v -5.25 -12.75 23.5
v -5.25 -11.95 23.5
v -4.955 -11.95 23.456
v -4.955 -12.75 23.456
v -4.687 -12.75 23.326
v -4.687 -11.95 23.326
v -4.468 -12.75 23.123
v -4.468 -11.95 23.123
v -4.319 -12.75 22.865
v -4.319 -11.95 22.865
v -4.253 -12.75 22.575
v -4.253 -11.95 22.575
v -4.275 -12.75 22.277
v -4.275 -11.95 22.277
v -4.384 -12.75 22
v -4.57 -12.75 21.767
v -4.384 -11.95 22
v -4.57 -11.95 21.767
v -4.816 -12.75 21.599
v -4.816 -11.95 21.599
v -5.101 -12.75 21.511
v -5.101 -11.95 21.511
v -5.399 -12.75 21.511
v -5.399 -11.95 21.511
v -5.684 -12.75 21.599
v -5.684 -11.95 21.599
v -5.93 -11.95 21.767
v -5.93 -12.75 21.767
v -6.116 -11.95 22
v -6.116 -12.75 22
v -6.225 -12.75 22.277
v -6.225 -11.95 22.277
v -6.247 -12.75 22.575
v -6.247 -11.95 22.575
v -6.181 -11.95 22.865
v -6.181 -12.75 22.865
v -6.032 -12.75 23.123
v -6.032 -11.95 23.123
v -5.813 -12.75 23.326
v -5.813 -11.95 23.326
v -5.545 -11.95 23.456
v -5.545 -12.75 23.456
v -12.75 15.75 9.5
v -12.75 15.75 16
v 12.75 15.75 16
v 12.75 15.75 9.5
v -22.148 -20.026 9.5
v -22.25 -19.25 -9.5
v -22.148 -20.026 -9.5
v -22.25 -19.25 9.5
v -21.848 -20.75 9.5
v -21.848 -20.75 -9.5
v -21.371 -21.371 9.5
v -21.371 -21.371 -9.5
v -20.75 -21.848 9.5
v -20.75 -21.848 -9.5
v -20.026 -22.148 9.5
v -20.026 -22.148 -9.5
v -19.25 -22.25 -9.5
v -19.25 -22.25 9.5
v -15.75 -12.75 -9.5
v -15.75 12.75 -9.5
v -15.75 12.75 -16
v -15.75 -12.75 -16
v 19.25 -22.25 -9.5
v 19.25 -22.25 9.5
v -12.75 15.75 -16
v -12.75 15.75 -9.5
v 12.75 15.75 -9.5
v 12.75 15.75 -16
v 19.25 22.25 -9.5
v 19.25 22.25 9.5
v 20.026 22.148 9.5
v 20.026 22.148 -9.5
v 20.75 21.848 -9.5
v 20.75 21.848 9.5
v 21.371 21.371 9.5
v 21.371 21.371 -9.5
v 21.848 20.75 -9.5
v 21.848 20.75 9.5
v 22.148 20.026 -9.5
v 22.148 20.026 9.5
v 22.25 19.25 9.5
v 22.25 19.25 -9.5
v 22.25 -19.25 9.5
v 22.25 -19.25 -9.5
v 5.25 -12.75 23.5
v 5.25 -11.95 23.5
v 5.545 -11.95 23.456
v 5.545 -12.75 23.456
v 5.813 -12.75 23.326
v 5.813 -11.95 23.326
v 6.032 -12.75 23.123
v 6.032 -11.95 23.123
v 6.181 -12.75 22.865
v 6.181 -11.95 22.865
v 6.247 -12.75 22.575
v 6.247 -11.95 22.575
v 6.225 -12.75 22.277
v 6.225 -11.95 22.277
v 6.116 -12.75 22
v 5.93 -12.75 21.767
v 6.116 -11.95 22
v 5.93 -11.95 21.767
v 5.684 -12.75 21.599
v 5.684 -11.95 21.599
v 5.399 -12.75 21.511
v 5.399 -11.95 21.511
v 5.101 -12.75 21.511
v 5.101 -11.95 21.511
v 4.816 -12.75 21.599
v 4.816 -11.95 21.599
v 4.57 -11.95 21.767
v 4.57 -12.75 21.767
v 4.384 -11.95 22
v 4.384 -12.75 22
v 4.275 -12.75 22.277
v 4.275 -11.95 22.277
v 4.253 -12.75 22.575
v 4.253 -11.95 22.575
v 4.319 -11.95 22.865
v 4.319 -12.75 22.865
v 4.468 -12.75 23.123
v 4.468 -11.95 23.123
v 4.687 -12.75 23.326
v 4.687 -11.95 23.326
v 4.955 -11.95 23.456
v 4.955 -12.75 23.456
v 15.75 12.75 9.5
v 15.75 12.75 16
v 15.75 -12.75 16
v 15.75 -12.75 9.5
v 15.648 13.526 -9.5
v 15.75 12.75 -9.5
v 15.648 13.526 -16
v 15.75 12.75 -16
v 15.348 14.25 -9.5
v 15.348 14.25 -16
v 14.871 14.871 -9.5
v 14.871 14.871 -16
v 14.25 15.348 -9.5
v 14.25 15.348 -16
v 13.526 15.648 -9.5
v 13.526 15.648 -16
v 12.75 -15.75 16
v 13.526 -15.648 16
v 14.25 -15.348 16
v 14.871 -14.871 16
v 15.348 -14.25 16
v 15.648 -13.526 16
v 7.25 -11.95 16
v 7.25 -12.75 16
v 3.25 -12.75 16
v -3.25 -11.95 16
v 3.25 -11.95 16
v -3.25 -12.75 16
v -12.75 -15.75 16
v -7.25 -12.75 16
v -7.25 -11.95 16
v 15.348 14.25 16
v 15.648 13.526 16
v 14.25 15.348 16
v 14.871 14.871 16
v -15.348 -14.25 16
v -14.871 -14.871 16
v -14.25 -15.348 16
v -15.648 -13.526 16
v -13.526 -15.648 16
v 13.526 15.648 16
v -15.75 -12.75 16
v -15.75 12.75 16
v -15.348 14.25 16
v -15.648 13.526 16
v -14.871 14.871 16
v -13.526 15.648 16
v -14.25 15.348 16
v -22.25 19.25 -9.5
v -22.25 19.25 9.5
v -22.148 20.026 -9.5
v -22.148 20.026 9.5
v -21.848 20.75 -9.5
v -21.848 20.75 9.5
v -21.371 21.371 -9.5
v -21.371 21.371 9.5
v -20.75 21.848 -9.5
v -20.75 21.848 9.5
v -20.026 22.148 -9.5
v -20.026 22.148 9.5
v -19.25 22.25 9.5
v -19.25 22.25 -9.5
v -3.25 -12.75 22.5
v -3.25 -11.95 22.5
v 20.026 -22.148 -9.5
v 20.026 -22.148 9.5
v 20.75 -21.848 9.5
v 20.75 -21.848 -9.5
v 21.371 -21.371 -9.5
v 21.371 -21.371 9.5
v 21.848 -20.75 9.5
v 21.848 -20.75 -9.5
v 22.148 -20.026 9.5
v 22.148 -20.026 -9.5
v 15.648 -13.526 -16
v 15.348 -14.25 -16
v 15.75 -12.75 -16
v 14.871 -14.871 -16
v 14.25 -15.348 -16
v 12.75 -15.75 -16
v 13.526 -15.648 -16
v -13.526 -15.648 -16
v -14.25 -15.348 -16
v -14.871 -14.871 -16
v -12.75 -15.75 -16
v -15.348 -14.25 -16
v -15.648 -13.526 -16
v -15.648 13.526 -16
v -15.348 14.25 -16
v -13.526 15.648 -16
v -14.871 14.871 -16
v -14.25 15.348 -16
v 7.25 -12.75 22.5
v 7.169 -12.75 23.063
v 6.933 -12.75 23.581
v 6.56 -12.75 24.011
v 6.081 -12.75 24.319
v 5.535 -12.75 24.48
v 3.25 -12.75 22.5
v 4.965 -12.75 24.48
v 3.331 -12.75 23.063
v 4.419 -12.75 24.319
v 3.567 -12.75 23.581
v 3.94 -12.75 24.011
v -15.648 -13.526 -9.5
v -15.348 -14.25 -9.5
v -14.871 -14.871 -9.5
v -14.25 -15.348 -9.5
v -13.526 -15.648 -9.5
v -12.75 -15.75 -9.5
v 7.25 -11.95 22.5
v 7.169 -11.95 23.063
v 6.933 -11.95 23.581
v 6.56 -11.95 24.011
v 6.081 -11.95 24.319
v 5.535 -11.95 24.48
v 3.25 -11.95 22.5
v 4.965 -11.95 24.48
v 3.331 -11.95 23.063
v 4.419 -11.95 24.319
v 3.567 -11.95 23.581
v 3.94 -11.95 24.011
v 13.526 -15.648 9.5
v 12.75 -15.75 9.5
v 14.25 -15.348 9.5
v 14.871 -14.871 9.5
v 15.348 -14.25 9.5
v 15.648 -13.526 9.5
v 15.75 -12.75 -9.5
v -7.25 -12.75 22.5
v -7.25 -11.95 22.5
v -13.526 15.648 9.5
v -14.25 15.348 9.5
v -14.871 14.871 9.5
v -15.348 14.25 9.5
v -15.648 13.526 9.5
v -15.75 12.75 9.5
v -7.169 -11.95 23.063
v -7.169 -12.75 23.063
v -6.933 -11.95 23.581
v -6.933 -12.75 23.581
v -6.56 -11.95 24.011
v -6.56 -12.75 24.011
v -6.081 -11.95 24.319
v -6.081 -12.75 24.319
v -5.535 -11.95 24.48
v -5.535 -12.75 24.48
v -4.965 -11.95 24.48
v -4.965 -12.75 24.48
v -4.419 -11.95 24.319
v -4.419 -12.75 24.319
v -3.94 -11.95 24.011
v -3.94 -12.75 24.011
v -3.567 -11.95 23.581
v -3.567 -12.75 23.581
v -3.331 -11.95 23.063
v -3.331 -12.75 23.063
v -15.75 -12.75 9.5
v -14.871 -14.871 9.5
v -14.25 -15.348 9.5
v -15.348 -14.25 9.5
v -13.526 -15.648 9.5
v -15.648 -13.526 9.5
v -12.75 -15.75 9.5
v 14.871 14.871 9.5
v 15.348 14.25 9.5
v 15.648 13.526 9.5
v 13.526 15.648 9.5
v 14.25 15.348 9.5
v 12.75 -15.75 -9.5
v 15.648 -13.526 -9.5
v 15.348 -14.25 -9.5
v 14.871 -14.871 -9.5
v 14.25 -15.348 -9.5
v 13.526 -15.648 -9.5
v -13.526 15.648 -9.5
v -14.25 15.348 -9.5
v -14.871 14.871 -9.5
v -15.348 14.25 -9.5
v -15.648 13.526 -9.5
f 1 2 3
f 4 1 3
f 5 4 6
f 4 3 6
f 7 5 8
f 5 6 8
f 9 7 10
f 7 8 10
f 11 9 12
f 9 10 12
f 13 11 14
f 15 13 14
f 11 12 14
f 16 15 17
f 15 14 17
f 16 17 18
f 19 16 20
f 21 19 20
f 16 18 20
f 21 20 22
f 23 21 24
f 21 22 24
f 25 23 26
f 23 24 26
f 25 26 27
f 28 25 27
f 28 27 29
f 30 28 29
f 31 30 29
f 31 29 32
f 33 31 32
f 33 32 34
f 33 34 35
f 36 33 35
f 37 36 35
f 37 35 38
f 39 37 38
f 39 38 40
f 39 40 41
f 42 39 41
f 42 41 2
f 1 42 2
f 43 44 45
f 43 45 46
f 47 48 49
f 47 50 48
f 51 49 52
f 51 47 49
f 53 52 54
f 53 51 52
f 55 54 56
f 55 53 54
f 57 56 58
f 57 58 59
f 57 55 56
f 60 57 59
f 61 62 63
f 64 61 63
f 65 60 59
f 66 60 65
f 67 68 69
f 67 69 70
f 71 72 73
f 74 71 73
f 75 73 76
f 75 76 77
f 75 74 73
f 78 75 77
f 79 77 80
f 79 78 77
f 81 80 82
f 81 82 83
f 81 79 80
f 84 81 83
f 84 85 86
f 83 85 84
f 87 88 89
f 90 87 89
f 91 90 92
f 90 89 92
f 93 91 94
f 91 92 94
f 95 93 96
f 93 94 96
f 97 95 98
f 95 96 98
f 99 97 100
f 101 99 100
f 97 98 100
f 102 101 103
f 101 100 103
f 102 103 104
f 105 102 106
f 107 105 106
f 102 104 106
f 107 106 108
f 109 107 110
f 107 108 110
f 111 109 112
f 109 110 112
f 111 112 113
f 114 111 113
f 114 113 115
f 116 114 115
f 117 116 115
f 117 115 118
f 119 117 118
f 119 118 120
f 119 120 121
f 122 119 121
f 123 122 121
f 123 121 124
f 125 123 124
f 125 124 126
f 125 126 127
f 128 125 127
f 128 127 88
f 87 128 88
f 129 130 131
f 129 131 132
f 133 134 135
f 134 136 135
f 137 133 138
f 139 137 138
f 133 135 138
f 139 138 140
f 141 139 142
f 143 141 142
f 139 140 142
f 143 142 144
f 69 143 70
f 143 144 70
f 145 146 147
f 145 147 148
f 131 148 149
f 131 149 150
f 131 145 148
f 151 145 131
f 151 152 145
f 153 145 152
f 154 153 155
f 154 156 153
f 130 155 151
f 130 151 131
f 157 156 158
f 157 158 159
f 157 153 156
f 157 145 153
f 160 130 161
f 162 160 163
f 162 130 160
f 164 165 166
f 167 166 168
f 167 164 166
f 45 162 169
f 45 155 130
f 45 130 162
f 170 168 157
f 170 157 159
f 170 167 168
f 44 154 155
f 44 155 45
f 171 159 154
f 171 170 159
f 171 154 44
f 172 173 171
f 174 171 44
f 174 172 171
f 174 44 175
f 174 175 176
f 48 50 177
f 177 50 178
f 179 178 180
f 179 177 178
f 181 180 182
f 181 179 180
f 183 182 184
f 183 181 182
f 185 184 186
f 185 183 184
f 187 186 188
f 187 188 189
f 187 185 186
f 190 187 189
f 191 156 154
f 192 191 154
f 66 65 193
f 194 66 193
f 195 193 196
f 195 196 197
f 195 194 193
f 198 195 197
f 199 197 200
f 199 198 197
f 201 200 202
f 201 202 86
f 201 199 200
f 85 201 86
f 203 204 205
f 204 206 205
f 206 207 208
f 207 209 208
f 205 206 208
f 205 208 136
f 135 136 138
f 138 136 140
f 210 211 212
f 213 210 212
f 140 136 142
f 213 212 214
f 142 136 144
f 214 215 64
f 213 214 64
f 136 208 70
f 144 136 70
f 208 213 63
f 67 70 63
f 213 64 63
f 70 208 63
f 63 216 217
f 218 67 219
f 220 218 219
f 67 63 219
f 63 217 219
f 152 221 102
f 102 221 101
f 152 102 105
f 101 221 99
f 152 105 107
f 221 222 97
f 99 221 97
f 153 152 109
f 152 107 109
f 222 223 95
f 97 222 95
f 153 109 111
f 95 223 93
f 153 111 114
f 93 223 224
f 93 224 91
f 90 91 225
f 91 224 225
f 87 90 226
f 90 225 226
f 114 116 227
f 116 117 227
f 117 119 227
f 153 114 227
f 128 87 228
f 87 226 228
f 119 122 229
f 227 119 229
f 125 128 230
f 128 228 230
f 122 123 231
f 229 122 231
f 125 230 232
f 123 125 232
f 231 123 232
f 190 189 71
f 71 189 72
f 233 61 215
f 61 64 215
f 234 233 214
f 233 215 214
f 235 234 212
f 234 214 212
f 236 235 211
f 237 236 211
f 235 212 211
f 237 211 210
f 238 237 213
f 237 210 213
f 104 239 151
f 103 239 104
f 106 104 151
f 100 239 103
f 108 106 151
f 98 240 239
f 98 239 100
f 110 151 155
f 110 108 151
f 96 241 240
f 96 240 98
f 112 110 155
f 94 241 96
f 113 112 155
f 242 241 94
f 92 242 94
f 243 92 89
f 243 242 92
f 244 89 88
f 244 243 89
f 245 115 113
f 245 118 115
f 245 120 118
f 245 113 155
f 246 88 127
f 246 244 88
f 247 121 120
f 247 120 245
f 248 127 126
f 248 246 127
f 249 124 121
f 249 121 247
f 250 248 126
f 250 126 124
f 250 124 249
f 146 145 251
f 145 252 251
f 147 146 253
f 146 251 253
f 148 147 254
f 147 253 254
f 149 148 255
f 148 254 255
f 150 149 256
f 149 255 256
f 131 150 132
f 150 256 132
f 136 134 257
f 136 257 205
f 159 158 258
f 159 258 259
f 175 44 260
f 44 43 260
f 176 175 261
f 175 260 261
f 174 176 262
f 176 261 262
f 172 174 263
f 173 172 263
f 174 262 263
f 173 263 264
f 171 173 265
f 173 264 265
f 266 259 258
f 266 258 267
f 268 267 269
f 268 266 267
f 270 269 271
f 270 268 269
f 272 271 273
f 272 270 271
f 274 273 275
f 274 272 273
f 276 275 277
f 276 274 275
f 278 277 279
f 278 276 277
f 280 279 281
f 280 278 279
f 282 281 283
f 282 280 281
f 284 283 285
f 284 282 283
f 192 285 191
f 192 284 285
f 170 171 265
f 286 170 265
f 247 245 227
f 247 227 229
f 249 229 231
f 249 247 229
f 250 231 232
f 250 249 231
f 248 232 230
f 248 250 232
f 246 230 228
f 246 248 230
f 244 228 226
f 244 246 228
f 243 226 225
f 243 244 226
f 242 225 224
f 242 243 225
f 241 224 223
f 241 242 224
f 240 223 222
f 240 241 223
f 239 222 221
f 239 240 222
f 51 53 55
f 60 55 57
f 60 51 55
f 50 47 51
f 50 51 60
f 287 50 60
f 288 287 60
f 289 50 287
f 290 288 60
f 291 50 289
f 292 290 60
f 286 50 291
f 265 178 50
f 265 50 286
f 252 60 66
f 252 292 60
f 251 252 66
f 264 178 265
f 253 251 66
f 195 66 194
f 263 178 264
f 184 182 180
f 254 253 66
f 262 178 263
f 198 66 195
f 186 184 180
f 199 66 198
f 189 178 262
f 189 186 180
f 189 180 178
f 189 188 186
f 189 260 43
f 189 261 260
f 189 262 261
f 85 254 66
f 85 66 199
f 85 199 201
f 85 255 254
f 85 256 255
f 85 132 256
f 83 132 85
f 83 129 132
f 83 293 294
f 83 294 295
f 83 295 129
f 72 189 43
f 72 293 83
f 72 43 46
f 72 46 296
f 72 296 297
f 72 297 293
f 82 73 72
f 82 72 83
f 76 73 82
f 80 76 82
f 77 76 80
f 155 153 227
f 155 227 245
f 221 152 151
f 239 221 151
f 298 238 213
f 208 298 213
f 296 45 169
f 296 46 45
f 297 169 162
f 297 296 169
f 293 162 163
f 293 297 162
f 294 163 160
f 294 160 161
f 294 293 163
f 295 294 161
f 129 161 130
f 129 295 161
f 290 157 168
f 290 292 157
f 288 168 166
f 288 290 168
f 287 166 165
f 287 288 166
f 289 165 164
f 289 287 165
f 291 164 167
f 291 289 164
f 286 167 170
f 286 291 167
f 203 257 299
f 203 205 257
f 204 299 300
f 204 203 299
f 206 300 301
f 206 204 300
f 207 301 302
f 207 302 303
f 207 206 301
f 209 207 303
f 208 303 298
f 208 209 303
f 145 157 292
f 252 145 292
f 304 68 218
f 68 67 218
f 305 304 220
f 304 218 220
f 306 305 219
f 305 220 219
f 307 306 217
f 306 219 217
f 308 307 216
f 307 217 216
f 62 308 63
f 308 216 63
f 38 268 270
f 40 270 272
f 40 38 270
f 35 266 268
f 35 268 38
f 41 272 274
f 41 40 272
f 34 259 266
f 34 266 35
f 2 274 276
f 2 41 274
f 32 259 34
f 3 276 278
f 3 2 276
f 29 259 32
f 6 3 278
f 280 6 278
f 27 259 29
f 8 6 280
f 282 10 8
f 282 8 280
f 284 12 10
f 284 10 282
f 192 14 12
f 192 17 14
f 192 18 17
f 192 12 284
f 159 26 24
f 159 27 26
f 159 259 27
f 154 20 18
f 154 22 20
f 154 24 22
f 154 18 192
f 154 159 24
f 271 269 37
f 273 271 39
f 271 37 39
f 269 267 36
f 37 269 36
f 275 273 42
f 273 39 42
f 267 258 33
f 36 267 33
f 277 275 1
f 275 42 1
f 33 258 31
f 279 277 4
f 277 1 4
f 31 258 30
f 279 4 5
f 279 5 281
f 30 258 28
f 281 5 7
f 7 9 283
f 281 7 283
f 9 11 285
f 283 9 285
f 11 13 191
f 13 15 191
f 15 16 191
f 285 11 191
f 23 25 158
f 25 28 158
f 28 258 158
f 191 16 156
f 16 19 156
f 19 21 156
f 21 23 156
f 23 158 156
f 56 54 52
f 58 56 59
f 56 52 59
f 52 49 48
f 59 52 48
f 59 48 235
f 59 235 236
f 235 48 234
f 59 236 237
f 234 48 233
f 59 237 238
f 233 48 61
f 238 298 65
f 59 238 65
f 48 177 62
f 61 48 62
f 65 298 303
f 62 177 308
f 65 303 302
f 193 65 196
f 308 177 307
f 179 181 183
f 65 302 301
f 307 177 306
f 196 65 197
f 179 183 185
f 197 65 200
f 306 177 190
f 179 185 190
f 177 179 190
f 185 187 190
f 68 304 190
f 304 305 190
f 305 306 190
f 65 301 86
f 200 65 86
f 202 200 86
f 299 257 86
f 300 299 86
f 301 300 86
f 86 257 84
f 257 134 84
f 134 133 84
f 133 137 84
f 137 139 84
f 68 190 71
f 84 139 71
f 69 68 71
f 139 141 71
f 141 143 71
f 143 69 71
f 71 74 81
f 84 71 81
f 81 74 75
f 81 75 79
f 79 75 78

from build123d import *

# Parameters (mm, degrees)
SKETCH1_W           = 44.5
SKETCH1_H           = 44.5
BASE_EXTRUDE_DEPTH  = 9.5
BOSS_EXTRUDE1_START = -15.75
SKETCH2_W           = 32
SKETCH2_H           = 31.5
BOSS_EXTRUDE1_DEPTH = 31.5
FILLET1_R           = 3
SKETCH3_W           = 4
SKETCH3_H           = 0.8
BOSS_EXTRUDE2_DEPTH = 6.5
BOSS_EXTRUDE3_DEPTH = 0.8
SKETCH5_R           = 1
CUT_EXTRUDE1_DEPTH  = 48.591517101


with BuildPart() as part:
    # Sketch1 → Base-Extrude (new, symmetric)
    with BuildSketch(Plane.XY):
        Rectangle(SKETCH1_W, SKETCH1_H)
    extrude(amount=BASE_EXTRUDE_DEPTH, both=True)

    # Sketch2 → Boss-Extrude1 (add)
    with BuildSketch(Plane(origin=(0, 0, 0), x_dir=(0, 0, -1), z_dir=(1, 0, 0)).offset(BOSS_EXTRUDE1_START)):
        Rectangle(SKETCH2_W, SKETCH2_H)
    extrude(amount=BOSS_EXTRUDE1_DEPTH)

    # Fillet1
    fillet1_edges = [part.edges().sort_by_distance(p)[0] for p in [
        (15.75, 15.75, -12.75),
        (15.75, -15.75, -12.75),
        (-15.75, -15.75, -12.75),
        (-15.75, 15.75, -12.75),
        (15.75, 15.75, 12.75),
        (15.75, -15.75, 12.75),
        (-15.75, -15.75, 12.75),
        (-15.75, 15.75, 12.75),
        (-22.25, 22.25, 0),
        (22.25, 22.25, 0),
        (22.25, -22.25, 0),
        (-22.25, -22.25, 0),
    ]]
    fillet(fillet1_edges, radius=FILLET1_R)

    # Sketch3 → Boss-Extrude2 (add)
    with BuildSketch(Plane.XY.offset(16)):
        with Locations((-5.25, -12.35)):
            Rectangle(SKETCH3_W, SKETCH3_H)
        with Locations((5.25, -12.35)):
            Rectangle(SKETCH3_W, SKETCH3_H)
    extrude(amount=BOSS_EXTRUDE2_DEPTH)

    # Sketch4 → Boss-Extrude3 (add)
    with BuildSketch(Plane(origin=(0, -11.95, 0), x_dir=(-1, 0, 0), z_dir=(0, 1, 0))):
        with BuildLine():
            Line((-7.25, 22.5), (-3.25, 22.5))
            ThreePointArc((-3.25, 22.5), (-5.25, 24.5), (-7.25, 22.5))
        make_face()
        with BuildLine():
            Line((3.25, 22.5), (7.25, 22.5))
            ThreePointArc((7.25, 22.5), (5.25, 24.5), (3.25, 22.5))
        make_face()
    extrude(amount=-BOSS_EXTRUDE3_DEPTH)

    # Sketch5 → Cut-Extrude1 (cut, through all)
    with BuildSketch(Plane(origin=(0, -11.95, 0), x_dir=(-1, 0, 0), z_dir=(0, 1, 0))):
        with Locations(Location((5.25, 22.5, 0), (0, 0, 90))):
            Circle(SKETCH5_R)
        with Locations(Location((-5.25, 22.5, 0), (0, 0, 90))):
            Circle(SKETCH5_R)
    extrude(amount=-CUT_EXTRUDE1_DEPTH, mode=Mode.SUBTRACT)


solid = part.part
